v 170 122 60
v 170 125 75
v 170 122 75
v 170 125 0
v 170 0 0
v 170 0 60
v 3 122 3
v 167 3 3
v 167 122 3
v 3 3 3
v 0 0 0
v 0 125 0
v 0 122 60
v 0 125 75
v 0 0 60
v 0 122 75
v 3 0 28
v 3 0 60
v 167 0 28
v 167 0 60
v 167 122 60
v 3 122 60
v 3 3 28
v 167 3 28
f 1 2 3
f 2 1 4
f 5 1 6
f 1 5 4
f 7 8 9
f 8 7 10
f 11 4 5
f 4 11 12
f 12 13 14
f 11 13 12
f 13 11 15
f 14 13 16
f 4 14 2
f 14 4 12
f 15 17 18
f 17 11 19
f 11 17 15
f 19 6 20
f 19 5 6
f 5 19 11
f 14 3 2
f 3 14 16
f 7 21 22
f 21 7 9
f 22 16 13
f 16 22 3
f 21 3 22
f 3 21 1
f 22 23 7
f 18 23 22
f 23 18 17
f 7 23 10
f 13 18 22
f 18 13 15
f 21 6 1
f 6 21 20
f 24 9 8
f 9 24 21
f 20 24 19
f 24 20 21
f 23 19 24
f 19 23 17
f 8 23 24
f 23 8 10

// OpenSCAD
// Sharting Poop Tray v3 - Simple Desk Tray
// Units: mm
// Purpose: freestanding tray that sits behind the printer.
// No hanger. No weird back geometry. No supports needed.
//
// Matching STL: sharting_poop_tray_v3_simple.stl

$fn = 48;

// -------------------------
// Dimensions
// -------------------------
tray_width  = 170;
tray_depth  = 125;

floor_thickness = 3;
wall_thickness  = 3;

rear_wall_height  = 75;
side_wall_height  = 60;
front_wall_height = 28;

// -------------------------
// Simple Tray
// -------------------------
module simple_poop_tray() {
    union() {
        // floor
        cube([tray_width, tray_depth, floor_thickness]);

        // rear wall
        translate([0, tray_depth - wall_thickness, 0])
            cube([tray_width, wall_thickness, rear_wall_height]);

        // left wall
        translate([0, 0, 0])
            cube([wall_thickness, tray_depth, side_wall_height]);

        // right wall
        translate([tray_width - wall_thickness, 0, 0])
            cube([wall_thickness, tray_depth, side_wall_height]);

        // front lip
        translate([0, 0, 0])
            cube([tray_width, wall_thickness, front_wall_height]);
    }
}

simple_poop_tray();
